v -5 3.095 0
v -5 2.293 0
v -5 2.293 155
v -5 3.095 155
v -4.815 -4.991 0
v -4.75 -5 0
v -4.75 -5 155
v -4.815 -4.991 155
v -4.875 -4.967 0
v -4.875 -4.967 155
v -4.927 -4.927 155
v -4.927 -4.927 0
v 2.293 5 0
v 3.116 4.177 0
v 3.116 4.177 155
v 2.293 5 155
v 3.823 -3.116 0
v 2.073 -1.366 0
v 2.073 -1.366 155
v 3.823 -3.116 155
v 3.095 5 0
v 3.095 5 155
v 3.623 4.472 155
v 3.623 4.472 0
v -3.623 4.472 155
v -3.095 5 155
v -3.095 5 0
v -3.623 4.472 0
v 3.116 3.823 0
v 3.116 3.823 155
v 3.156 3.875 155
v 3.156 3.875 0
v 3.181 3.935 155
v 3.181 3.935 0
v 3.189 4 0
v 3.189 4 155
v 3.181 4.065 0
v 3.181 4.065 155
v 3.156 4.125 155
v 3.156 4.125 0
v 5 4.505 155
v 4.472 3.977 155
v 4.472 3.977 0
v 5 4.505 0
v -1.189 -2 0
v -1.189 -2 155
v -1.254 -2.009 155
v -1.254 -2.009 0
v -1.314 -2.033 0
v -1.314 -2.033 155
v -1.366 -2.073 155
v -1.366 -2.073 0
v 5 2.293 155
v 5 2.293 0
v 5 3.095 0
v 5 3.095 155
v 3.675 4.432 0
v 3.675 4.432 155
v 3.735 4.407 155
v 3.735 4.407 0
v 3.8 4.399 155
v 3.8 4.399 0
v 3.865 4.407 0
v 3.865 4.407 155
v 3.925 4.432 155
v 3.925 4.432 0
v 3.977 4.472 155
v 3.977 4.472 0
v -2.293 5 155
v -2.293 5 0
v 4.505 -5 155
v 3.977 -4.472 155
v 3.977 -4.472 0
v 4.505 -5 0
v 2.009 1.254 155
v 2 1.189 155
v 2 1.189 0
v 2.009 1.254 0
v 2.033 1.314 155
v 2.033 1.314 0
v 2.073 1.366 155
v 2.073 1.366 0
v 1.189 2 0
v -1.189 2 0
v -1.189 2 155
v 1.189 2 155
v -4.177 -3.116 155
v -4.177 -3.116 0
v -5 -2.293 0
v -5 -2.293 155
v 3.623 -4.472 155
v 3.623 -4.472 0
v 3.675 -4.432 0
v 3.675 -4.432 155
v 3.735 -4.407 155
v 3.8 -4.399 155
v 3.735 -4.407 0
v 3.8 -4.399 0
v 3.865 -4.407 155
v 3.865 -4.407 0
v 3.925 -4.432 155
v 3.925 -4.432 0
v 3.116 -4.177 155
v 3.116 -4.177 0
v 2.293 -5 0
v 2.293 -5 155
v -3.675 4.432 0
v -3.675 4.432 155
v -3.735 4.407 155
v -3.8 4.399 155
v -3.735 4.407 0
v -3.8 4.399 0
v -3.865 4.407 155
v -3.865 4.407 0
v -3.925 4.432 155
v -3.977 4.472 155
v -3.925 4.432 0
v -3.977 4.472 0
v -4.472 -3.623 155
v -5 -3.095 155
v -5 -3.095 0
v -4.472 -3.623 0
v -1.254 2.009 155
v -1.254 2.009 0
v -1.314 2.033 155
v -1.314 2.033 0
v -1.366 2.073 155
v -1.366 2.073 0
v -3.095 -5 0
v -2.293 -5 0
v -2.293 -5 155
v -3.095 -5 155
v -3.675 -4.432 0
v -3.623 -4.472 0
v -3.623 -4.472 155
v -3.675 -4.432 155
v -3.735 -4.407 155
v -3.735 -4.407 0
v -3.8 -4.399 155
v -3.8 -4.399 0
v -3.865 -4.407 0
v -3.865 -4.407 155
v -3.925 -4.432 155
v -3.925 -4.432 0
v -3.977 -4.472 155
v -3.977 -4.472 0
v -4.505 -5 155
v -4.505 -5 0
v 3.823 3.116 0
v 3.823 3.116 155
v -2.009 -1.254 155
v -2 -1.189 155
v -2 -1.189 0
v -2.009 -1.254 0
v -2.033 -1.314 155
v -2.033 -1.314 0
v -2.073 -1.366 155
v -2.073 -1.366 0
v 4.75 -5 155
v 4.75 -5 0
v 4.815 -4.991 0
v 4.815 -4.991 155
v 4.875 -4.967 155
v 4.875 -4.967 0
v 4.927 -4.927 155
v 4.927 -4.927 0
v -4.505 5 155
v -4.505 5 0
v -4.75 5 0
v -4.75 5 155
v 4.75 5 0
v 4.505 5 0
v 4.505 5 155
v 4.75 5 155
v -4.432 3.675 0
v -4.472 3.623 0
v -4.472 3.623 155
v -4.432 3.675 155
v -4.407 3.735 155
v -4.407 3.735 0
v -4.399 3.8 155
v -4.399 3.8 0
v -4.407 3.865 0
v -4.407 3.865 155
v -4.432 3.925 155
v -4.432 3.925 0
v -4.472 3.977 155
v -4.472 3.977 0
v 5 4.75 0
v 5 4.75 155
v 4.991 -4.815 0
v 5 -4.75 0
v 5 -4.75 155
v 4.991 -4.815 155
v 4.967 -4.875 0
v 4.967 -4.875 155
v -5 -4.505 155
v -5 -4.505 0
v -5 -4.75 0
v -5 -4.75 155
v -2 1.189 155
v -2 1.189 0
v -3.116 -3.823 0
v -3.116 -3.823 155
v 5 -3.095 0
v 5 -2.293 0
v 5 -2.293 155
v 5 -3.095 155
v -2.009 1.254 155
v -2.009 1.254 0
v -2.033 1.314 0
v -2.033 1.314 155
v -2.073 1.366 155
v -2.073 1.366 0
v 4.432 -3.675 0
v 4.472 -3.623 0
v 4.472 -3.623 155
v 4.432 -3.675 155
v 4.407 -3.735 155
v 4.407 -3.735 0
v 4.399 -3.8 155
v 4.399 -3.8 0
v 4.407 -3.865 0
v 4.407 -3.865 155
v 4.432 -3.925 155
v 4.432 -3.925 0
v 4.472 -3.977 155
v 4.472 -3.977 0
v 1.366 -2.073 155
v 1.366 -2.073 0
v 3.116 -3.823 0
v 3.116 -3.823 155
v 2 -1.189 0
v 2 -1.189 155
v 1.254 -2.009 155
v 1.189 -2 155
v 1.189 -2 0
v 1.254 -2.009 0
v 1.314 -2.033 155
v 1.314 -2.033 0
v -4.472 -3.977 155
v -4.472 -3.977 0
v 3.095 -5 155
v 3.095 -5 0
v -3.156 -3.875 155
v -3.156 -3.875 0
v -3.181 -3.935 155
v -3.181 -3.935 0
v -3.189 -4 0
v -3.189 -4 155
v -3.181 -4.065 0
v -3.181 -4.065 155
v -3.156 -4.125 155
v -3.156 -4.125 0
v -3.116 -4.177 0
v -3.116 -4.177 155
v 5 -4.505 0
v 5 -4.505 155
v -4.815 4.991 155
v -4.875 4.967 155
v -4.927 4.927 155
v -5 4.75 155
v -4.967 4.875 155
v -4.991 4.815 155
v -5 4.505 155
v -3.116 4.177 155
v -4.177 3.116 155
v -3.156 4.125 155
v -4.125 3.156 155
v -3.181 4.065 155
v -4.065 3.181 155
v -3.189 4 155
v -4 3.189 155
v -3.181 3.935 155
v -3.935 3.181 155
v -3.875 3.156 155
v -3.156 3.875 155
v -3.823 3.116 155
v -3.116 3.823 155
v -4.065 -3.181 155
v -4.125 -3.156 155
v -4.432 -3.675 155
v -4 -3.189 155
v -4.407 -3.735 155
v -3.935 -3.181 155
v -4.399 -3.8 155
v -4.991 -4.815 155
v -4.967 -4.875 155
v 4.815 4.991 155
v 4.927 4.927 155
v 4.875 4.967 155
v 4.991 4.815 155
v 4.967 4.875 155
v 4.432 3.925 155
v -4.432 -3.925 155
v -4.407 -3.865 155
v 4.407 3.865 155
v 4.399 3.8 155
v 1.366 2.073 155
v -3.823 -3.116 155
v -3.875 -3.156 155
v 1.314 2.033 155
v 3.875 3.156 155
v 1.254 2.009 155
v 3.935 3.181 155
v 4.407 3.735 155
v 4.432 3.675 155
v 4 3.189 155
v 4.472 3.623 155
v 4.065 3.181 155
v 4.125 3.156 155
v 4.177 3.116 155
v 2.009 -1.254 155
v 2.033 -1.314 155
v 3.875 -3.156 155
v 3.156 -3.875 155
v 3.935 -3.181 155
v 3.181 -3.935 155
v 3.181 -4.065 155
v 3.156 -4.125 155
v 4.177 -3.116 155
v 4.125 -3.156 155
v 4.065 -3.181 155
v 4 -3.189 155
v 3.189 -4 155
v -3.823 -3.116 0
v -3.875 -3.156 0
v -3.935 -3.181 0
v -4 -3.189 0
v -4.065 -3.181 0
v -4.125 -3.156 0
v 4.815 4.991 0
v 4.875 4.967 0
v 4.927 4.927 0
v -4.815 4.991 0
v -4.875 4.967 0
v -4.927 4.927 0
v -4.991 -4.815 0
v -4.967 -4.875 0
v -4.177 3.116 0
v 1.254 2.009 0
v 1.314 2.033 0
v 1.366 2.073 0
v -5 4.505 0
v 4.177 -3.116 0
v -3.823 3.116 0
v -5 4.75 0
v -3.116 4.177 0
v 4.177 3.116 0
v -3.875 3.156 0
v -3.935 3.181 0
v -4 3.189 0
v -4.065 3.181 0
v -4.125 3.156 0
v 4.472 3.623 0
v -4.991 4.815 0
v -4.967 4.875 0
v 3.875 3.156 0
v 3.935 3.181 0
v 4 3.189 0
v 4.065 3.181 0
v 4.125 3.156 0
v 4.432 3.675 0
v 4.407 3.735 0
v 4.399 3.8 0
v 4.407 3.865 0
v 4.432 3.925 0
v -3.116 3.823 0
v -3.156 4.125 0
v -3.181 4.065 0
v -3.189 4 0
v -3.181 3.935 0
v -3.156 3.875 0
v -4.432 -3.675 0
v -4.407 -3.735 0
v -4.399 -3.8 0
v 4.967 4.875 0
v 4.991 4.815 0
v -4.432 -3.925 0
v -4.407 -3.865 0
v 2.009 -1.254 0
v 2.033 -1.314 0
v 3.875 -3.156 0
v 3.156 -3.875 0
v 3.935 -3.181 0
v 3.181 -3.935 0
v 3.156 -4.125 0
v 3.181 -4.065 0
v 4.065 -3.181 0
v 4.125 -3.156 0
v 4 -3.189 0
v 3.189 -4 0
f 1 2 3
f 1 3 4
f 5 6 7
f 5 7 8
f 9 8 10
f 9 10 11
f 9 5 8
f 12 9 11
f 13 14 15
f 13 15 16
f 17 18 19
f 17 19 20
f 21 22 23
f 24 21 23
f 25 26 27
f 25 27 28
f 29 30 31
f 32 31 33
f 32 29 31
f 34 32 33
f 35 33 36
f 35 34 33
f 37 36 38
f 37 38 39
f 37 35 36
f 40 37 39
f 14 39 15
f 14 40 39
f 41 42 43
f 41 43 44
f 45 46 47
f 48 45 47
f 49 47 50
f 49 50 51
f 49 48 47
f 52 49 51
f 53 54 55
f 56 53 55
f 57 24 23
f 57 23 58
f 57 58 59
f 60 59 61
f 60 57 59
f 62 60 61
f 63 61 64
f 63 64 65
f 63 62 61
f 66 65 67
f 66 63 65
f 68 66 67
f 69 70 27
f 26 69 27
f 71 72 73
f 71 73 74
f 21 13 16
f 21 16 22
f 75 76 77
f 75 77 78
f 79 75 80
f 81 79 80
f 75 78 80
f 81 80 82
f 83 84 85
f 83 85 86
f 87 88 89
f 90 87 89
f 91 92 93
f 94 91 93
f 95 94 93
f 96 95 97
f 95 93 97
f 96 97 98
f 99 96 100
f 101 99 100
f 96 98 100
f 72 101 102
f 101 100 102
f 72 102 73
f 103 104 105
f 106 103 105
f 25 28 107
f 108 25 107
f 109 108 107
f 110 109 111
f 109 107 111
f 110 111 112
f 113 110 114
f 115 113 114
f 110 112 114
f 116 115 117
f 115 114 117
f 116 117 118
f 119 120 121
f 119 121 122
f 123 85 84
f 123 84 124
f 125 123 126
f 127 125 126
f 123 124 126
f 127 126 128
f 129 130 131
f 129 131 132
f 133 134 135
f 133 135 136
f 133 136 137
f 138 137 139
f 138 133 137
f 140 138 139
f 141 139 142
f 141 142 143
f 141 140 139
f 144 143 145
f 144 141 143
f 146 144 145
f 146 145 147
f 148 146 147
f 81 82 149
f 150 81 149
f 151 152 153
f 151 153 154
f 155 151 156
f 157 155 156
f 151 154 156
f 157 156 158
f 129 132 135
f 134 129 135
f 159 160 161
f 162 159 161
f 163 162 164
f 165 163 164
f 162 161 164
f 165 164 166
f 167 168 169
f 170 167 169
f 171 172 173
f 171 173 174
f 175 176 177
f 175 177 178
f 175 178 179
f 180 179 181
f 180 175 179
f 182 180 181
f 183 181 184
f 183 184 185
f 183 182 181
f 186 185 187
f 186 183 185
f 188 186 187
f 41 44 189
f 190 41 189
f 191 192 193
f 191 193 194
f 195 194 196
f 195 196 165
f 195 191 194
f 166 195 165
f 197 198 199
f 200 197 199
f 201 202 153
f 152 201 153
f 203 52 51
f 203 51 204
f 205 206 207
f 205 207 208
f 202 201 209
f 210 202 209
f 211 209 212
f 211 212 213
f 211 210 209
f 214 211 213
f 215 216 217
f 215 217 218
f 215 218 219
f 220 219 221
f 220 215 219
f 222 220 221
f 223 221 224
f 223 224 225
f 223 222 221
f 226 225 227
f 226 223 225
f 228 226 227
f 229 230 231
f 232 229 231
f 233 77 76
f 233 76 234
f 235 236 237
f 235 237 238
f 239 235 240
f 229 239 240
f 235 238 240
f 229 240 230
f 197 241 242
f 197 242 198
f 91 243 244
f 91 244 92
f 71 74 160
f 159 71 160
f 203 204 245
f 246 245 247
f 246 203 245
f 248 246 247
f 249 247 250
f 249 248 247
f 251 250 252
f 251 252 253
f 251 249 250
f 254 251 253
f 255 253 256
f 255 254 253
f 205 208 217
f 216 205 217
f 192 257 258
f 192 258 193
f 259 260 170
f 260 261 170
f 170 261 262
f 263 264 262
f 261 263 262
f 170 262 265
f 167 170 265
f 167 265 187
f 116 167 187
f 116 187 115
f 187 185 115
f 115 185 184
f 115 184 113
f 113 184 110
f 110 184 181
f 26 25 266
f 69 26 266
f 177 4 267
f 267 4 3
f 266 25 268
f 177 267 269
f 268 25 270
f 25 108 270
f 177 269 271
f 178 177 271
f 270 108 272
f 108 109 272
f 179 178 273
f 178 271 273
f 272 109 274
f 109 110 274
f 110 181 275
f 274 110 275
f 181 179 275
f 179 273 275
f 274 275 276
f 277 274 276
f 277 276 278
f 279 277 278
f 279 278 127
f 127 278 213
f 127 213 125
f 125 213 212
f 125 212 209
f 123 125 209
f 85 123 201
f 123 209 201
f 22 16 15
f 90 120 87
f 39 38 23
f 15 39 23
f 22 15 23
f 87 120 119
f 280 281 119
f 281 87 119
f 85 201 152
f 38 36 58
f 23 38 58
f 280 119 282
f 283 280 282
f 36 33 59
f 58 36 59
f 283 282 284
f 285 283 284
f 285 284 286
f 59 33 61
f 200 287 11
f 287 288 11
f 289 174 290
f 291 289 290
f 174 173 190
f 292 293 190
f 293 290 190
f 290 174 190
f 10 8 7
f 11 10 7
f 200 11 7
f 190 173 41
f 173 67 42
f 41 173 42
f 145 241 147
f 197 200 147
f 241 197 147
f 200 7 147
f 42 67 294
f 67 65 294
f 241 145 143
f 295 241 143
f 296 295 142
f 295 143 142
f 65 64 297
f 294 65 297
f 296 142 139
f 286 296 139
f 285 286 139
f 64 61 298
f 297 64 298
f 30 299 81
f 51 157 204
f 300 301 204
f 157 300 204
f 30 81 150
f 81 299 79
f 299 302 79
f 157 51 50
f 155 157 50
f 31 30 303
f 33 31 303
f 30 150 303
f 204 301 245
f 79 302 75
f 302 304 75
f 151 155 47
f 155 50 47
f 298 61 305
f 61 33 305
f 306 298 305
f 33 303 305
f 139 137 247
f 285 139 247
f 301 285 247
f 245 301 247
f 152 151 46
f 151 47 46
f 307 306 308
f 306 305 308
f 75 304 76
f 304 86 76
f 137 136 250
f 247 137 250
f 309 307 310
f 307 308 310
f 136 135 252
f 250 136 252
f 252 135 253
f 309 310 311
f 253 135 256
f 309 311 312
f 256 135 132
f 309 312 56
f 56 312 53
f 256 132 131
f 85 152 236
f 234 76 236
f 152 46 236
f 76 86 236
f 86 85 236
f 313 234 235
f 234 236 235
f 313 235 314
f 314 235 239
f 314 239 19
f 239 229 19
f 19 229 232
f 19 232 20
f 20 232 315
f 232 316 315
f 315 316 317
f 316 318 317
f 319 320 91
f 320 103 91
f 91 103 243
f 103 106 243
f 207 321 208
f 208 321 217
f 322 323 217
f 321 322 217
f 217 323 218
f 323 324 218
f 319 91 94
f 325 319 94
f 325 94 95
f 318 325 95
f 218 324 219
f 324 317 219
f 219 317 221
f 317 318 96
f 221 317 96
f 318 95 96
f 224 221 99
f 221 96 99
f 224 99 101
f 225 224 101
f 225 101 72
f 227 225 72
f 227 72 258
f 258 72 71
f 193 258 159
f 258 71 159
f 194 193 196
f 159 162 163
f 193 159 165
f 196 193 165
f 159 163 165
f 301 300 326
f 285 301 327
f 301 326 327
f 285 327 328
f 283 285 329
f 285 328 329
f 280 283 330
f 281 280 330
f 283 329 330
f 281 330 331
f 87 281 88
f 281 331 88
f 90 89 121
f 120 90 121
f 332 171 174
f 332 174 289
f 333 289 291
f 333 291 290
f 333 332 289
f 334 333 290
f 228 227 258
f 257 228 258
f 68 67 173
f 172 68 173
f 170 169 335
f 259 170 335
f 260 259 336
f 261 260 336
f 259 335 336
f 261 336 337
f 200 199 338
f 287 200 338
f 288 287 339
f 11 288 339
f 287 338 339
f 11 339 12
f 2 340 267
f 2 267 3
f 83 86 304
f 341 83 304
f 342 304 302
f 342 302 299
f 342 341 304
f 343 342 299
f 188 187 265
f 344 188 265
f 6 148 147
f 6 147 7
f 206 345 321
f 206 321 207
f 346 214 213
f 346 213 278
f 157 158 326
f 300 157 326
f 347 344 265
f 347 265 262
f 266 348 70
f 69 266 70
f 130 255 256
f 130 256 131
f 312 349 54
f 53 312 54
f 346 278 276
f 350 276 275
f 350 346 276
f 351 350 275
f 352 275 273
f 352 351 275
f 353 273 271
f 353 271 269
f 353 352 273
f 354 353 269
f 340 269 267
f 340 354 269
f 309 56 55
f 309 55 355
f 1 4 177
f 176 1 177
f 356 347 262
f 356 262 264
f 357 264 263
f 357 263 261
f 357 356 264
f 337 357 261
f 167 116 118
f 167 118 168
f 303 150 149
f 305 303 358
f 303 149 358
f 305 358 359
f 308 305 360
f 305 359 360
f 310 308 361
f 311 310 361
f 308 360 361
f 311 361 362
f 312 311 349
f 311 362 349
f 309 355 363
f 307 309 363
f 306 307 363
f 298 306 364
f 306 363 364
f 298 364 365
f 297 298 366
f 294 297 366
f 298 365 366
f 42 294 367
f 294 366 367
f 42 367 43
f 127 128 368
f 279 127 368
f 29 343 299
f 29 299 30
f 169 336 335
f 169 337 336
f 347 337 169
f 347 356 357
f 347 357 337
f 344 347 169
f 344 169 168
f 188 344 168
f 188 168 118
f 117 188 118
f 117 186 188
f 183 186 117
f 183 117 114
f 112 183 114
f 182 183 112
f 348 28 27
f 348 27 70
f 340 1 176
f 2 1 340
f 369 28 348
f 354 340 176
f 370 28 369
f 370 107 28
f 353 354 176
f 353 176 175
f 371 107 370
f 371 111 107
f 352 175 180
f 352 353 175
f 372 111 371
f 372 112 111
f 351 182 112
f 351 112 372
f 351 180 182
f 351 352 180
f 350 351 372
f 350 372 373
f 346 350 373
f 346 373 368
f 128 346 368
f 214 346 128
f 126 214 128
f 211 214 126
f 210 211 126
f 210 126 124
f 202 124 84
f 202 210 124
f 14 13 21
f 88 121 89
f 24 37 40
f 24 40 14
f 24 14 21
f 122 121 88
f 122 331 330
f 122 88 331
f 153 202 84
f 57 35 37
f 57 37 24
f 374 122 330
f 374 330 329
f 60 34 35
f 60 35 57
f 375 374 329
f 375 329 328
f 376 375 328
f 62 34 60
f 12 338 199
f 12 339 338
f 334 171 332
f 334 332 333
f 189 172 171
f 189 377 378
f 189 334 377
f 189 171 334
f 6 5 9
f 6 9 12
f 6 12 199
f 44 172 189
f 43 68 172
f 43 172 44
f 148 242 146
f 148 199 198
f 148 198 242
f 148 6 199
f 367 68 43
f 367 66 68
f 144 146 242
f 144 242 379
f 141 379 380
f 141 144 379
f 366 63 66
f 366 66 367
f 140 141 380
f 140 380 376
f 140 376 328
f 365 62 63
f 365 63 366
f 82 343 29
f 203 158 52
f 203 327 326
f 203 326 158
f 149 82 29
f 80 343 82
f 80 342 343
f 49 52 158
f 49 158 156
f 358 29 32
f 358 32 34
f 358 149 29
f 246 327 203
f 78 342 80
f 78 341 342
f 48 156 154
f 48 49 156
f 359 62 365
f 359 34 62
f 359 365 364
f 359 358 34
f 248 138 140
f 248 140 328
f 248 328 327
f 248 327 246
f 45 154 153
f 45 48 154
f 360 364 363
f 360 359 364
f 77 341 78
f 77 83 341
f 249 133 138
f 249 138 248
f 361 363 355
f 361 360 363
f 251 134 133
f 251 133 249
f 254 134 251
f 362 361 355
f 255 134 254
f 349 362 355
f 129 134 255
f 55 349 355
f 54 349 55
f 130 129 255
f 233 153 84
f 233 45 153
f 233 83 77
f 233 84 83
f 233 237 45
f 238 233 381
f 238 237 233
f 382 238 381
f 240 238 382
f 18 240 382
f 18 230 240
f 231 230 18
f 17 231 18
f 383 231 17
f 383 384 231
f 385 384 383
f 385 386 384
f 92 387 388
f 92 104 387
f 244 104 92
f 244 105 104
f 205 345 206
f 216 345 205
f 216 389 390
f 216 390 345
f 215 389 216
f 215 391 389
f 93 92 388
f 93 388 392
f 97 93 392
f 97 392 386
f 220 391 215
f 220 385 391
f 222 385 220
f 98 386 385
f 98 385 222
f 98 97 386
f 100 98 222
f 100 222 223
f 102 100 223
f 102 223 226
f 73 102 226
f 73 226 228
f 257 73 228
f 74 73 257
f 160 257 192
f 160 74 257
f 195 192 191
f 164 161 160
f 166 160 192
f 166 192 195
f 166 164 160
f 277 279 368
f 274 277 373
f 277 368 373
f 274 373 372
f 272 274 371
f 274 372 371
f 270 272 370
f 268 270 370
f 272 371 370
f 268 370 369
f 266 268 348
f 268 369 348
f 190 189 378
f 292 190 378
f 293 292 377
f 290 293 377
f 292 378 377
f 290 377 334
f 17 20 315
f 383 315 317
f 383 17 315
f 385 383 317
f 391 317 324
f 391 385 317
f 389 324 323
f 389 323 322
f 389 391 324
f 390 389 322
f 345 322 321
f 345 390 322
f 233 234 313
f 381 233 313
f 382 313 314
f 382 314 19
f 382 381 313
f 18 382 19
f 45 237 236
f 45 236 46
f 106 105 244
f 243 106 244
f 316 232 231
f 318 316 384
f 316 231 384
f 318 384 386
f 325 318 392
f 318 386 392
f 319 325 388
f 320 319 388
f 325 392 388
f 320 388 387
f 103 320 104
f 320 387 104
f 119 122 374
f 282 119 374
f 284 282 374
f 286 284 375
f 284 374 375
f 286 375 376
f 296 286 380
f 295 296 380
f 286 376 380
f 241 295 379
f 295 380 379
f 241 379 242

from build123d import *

# Parameters (mm, degrees)
BOSS_EXTRUDE1_DEPTH      = 155
CIRPATTERN4_COUNT        = 4
CIRPATTERN4_COPY_1_DEPTH = 155
CIRPATTERN4_COPY_2_DEPTH = 155
CIRPATTERN4_COPY_3_DEPTH = 155


with BuildPart() as part:
    # Sketch2 → Boss-Extrude1 (new body)
    with BuildSketch(Plane.XY):
        with BuildLine():
            Line((-1.366116524, 2.073223305), (-3.116116524, 3.823223305))
            ThreePointArc((-3.116116524, 3.823223305), (-3.189339828, 4), (-3.116116524, 4.176776695))
            Line((-3.116116524, 4.176776695), (-2.292893219, 5))
            Line((-2.292893219, 5), (-3.094974747, 5))
            Line((-3.094974747, 5), (-3.623223305, 4.471751442))
            ThreePointArc((-3.623223305, 4.471751442), (-3.8, 4.398528137), (-3.976776695, 4.471751442))
            Line((-3.976776695, 4.471751442), (-4.505025253, 5))
            Line((-4.505025253, 5), (-4.75, 5))
            ThreePointArc((-4.75, 5), (-4.845670858, 4.980969883), (-4.926776695, 4.926776695))
            Line((-4.926776695, 4.926776695), (0, 0))
            Line((0, 0), (0, 2))
            Line((0, 2), (-1.189339828, 2))
            ThreePointArc((-1.189339828, 2), (-1.285010686, 2.019030117), (-1.366116524, 2.073223305))
        make_face()
    boss_extrude1 = extrude(amount=BOSS_EXTRUDE1_DEPTH)

    # Mirror1: Boss-Extrude1 across plane
    add(boss_extrude1.mirror(Plane(origin=(0, 0, 155), x_dir=(0, 0, 1), z_dir=(0.707106781, 0.707106781, 0))))

    # CirPattern4: Boss-Extrude1 ×4 about axis
    cirpattern4_axis = Axis((0, 0, 0), (0, 0, 1))
    for i in range(1, CIRPATTERN4_COUNT):
        add(boss_extrude1.rotate(cirpattern4_axis, i * 360 / CIRPATTERN4_COUNT))

    # CirPattern4 copy 1 sketch → CirPattern4 copy 1 (add)
    with BuildSketch(Plane.XY):
        with BuildLine():
            Line((-1.366116524, -2.073223305), (-3.116116524, -3.823223305))
            ThreePointArc((-3.116116524, -3.823223305), (-3.189339828, -4), (-3.116116524, -4.176776695))
            Line((-3.116116524, -4.176776695), (-2.292893219, -5))
            Line((-2.292893219, -5), (-3.094974747, -5))
            Line((-3.094974747, -5), (-3.623223305, -4.471751442))
            ThreePointArc((-3.623223305, -4.471751442), (-3.8, -4.398528137), (-3.976776695, -4.471751442))
            Line((-3.976776695, -4.471751442), (-4.505025253, -5))
            Line((-4.505025253, -5), (-4.75, -5))
            ThreePointArc((-4.75, -5), (-4.845670858, -4.980969883), (-4.926776695, -4.926776695))
            Line((-4.926776695, -4.926776695), (0, 0))
            Line((0, 0), (0, -2))
            Line((0, -2), (-1.189339828, -2))
            ThreePointArc((-1.189339828, -2), (-1.285010686, -2.019030117), (-1.366116524, -2.073223305))
        make_face()
    extrude(amount=CIRPATTERN4_COPY_1_DEPTH)

    # CirPattern4 copy 2 sketch → CirPattern4 copy 2 (add)
    with BuildSketch(Plane(origin=(0, 0, 0), x_dir=(0, 1, 0), z_dir=(0, 0, 1))):
        with BuildLine():
            Line((-1.366116524, -2.073223305), (-3.116116524, -3.823223305))
            ThreePointArc((-3.116116524, -3.823223305), (-3.189339828, -4), (-3.116116524, -4.176776695))
            Line((-3.116116524, -4.176776695), (-2.292893219, -5))
            Line((-2.292893219, -5), (-3.094974747, -5))
            Line((-3.094974747, -5), (-3.623223305, -4.471751442))
            ThreePointArc((-3.623223305, -4.471751442), (-3.8, -4.398528137), (-3.976776695, -4.471751442))
            Line((-3.976776695, -4.471751442), (-4.505025253, -5))
            Line((-4.505025253, -5), (-4.75, -5))
            ThreePointArc((-4.75, -5), (-4.845670858, -4.980969883), (-4.926776695, -4.926776695))
            Line((-4.926776695, -4.926776695), (0, 0))
            Line((0, 0), (0, -2))
            Line((0, -2), (-1.189339828, -2))
            ThreePointArc((-1.189339828, -2), (-1.285010686, -2.019030117), (-1.366116524, -2.073223305))
        make_face()
    extrude(amount=CIRPATTERN4_COPY_2_DEPTH)

    # CirPattern4 copy 3 sketch → CirPattern4 copy 3 (add)
    with BuildSketch(Plane(origin=(0, 0, 0), x_dir=(-1, 0, 0), z_dir=(0, 0, 1))):
        with BuildLine():
            Line((-1.366116524, -2.073223305), (-3.116116524, -3.823223305))
            ThreePointArc((-3.116116524, -3.823223305), (-3.189339828, -4), (-3.116116524, -4.176776695))
            Line((-3.116116524, -4.176776695), (-2.292893219, -5))
            Line((-2.292893219, -5), (-3.094974747, -5))
            Line((-3.094974747, -5), (-3.623223305, -4.471751442))
            ThreePointArc((-3.623223305, -4.471751442), (-3.8, -4.398528137), (-3.976776695, -4.471751442))
            Line((-3.976776695, -4.471751442), (-4.505025253, -5))
            Line((-4.505025253, -5), (-4.75, -5))
            ThreePointArc((-4.75, -5), (-4.845670858, -4.980969883), (-4.926776695, -4.926776695))
            Line((-4.926776695, -4.926776695), (0, 0))
            Line((0, 0), (0, -2))
            Line((0, -2), (-1.189339828, -2))
            ThreePointArc((-1.189339828, -2), (-1.285010686, -2.019030117), (-1.366116524, -2.073223305))
        make_face()
    extrude(amount=CIRPATTERN4_COPY_3_DEPTH)


solid = part.part
